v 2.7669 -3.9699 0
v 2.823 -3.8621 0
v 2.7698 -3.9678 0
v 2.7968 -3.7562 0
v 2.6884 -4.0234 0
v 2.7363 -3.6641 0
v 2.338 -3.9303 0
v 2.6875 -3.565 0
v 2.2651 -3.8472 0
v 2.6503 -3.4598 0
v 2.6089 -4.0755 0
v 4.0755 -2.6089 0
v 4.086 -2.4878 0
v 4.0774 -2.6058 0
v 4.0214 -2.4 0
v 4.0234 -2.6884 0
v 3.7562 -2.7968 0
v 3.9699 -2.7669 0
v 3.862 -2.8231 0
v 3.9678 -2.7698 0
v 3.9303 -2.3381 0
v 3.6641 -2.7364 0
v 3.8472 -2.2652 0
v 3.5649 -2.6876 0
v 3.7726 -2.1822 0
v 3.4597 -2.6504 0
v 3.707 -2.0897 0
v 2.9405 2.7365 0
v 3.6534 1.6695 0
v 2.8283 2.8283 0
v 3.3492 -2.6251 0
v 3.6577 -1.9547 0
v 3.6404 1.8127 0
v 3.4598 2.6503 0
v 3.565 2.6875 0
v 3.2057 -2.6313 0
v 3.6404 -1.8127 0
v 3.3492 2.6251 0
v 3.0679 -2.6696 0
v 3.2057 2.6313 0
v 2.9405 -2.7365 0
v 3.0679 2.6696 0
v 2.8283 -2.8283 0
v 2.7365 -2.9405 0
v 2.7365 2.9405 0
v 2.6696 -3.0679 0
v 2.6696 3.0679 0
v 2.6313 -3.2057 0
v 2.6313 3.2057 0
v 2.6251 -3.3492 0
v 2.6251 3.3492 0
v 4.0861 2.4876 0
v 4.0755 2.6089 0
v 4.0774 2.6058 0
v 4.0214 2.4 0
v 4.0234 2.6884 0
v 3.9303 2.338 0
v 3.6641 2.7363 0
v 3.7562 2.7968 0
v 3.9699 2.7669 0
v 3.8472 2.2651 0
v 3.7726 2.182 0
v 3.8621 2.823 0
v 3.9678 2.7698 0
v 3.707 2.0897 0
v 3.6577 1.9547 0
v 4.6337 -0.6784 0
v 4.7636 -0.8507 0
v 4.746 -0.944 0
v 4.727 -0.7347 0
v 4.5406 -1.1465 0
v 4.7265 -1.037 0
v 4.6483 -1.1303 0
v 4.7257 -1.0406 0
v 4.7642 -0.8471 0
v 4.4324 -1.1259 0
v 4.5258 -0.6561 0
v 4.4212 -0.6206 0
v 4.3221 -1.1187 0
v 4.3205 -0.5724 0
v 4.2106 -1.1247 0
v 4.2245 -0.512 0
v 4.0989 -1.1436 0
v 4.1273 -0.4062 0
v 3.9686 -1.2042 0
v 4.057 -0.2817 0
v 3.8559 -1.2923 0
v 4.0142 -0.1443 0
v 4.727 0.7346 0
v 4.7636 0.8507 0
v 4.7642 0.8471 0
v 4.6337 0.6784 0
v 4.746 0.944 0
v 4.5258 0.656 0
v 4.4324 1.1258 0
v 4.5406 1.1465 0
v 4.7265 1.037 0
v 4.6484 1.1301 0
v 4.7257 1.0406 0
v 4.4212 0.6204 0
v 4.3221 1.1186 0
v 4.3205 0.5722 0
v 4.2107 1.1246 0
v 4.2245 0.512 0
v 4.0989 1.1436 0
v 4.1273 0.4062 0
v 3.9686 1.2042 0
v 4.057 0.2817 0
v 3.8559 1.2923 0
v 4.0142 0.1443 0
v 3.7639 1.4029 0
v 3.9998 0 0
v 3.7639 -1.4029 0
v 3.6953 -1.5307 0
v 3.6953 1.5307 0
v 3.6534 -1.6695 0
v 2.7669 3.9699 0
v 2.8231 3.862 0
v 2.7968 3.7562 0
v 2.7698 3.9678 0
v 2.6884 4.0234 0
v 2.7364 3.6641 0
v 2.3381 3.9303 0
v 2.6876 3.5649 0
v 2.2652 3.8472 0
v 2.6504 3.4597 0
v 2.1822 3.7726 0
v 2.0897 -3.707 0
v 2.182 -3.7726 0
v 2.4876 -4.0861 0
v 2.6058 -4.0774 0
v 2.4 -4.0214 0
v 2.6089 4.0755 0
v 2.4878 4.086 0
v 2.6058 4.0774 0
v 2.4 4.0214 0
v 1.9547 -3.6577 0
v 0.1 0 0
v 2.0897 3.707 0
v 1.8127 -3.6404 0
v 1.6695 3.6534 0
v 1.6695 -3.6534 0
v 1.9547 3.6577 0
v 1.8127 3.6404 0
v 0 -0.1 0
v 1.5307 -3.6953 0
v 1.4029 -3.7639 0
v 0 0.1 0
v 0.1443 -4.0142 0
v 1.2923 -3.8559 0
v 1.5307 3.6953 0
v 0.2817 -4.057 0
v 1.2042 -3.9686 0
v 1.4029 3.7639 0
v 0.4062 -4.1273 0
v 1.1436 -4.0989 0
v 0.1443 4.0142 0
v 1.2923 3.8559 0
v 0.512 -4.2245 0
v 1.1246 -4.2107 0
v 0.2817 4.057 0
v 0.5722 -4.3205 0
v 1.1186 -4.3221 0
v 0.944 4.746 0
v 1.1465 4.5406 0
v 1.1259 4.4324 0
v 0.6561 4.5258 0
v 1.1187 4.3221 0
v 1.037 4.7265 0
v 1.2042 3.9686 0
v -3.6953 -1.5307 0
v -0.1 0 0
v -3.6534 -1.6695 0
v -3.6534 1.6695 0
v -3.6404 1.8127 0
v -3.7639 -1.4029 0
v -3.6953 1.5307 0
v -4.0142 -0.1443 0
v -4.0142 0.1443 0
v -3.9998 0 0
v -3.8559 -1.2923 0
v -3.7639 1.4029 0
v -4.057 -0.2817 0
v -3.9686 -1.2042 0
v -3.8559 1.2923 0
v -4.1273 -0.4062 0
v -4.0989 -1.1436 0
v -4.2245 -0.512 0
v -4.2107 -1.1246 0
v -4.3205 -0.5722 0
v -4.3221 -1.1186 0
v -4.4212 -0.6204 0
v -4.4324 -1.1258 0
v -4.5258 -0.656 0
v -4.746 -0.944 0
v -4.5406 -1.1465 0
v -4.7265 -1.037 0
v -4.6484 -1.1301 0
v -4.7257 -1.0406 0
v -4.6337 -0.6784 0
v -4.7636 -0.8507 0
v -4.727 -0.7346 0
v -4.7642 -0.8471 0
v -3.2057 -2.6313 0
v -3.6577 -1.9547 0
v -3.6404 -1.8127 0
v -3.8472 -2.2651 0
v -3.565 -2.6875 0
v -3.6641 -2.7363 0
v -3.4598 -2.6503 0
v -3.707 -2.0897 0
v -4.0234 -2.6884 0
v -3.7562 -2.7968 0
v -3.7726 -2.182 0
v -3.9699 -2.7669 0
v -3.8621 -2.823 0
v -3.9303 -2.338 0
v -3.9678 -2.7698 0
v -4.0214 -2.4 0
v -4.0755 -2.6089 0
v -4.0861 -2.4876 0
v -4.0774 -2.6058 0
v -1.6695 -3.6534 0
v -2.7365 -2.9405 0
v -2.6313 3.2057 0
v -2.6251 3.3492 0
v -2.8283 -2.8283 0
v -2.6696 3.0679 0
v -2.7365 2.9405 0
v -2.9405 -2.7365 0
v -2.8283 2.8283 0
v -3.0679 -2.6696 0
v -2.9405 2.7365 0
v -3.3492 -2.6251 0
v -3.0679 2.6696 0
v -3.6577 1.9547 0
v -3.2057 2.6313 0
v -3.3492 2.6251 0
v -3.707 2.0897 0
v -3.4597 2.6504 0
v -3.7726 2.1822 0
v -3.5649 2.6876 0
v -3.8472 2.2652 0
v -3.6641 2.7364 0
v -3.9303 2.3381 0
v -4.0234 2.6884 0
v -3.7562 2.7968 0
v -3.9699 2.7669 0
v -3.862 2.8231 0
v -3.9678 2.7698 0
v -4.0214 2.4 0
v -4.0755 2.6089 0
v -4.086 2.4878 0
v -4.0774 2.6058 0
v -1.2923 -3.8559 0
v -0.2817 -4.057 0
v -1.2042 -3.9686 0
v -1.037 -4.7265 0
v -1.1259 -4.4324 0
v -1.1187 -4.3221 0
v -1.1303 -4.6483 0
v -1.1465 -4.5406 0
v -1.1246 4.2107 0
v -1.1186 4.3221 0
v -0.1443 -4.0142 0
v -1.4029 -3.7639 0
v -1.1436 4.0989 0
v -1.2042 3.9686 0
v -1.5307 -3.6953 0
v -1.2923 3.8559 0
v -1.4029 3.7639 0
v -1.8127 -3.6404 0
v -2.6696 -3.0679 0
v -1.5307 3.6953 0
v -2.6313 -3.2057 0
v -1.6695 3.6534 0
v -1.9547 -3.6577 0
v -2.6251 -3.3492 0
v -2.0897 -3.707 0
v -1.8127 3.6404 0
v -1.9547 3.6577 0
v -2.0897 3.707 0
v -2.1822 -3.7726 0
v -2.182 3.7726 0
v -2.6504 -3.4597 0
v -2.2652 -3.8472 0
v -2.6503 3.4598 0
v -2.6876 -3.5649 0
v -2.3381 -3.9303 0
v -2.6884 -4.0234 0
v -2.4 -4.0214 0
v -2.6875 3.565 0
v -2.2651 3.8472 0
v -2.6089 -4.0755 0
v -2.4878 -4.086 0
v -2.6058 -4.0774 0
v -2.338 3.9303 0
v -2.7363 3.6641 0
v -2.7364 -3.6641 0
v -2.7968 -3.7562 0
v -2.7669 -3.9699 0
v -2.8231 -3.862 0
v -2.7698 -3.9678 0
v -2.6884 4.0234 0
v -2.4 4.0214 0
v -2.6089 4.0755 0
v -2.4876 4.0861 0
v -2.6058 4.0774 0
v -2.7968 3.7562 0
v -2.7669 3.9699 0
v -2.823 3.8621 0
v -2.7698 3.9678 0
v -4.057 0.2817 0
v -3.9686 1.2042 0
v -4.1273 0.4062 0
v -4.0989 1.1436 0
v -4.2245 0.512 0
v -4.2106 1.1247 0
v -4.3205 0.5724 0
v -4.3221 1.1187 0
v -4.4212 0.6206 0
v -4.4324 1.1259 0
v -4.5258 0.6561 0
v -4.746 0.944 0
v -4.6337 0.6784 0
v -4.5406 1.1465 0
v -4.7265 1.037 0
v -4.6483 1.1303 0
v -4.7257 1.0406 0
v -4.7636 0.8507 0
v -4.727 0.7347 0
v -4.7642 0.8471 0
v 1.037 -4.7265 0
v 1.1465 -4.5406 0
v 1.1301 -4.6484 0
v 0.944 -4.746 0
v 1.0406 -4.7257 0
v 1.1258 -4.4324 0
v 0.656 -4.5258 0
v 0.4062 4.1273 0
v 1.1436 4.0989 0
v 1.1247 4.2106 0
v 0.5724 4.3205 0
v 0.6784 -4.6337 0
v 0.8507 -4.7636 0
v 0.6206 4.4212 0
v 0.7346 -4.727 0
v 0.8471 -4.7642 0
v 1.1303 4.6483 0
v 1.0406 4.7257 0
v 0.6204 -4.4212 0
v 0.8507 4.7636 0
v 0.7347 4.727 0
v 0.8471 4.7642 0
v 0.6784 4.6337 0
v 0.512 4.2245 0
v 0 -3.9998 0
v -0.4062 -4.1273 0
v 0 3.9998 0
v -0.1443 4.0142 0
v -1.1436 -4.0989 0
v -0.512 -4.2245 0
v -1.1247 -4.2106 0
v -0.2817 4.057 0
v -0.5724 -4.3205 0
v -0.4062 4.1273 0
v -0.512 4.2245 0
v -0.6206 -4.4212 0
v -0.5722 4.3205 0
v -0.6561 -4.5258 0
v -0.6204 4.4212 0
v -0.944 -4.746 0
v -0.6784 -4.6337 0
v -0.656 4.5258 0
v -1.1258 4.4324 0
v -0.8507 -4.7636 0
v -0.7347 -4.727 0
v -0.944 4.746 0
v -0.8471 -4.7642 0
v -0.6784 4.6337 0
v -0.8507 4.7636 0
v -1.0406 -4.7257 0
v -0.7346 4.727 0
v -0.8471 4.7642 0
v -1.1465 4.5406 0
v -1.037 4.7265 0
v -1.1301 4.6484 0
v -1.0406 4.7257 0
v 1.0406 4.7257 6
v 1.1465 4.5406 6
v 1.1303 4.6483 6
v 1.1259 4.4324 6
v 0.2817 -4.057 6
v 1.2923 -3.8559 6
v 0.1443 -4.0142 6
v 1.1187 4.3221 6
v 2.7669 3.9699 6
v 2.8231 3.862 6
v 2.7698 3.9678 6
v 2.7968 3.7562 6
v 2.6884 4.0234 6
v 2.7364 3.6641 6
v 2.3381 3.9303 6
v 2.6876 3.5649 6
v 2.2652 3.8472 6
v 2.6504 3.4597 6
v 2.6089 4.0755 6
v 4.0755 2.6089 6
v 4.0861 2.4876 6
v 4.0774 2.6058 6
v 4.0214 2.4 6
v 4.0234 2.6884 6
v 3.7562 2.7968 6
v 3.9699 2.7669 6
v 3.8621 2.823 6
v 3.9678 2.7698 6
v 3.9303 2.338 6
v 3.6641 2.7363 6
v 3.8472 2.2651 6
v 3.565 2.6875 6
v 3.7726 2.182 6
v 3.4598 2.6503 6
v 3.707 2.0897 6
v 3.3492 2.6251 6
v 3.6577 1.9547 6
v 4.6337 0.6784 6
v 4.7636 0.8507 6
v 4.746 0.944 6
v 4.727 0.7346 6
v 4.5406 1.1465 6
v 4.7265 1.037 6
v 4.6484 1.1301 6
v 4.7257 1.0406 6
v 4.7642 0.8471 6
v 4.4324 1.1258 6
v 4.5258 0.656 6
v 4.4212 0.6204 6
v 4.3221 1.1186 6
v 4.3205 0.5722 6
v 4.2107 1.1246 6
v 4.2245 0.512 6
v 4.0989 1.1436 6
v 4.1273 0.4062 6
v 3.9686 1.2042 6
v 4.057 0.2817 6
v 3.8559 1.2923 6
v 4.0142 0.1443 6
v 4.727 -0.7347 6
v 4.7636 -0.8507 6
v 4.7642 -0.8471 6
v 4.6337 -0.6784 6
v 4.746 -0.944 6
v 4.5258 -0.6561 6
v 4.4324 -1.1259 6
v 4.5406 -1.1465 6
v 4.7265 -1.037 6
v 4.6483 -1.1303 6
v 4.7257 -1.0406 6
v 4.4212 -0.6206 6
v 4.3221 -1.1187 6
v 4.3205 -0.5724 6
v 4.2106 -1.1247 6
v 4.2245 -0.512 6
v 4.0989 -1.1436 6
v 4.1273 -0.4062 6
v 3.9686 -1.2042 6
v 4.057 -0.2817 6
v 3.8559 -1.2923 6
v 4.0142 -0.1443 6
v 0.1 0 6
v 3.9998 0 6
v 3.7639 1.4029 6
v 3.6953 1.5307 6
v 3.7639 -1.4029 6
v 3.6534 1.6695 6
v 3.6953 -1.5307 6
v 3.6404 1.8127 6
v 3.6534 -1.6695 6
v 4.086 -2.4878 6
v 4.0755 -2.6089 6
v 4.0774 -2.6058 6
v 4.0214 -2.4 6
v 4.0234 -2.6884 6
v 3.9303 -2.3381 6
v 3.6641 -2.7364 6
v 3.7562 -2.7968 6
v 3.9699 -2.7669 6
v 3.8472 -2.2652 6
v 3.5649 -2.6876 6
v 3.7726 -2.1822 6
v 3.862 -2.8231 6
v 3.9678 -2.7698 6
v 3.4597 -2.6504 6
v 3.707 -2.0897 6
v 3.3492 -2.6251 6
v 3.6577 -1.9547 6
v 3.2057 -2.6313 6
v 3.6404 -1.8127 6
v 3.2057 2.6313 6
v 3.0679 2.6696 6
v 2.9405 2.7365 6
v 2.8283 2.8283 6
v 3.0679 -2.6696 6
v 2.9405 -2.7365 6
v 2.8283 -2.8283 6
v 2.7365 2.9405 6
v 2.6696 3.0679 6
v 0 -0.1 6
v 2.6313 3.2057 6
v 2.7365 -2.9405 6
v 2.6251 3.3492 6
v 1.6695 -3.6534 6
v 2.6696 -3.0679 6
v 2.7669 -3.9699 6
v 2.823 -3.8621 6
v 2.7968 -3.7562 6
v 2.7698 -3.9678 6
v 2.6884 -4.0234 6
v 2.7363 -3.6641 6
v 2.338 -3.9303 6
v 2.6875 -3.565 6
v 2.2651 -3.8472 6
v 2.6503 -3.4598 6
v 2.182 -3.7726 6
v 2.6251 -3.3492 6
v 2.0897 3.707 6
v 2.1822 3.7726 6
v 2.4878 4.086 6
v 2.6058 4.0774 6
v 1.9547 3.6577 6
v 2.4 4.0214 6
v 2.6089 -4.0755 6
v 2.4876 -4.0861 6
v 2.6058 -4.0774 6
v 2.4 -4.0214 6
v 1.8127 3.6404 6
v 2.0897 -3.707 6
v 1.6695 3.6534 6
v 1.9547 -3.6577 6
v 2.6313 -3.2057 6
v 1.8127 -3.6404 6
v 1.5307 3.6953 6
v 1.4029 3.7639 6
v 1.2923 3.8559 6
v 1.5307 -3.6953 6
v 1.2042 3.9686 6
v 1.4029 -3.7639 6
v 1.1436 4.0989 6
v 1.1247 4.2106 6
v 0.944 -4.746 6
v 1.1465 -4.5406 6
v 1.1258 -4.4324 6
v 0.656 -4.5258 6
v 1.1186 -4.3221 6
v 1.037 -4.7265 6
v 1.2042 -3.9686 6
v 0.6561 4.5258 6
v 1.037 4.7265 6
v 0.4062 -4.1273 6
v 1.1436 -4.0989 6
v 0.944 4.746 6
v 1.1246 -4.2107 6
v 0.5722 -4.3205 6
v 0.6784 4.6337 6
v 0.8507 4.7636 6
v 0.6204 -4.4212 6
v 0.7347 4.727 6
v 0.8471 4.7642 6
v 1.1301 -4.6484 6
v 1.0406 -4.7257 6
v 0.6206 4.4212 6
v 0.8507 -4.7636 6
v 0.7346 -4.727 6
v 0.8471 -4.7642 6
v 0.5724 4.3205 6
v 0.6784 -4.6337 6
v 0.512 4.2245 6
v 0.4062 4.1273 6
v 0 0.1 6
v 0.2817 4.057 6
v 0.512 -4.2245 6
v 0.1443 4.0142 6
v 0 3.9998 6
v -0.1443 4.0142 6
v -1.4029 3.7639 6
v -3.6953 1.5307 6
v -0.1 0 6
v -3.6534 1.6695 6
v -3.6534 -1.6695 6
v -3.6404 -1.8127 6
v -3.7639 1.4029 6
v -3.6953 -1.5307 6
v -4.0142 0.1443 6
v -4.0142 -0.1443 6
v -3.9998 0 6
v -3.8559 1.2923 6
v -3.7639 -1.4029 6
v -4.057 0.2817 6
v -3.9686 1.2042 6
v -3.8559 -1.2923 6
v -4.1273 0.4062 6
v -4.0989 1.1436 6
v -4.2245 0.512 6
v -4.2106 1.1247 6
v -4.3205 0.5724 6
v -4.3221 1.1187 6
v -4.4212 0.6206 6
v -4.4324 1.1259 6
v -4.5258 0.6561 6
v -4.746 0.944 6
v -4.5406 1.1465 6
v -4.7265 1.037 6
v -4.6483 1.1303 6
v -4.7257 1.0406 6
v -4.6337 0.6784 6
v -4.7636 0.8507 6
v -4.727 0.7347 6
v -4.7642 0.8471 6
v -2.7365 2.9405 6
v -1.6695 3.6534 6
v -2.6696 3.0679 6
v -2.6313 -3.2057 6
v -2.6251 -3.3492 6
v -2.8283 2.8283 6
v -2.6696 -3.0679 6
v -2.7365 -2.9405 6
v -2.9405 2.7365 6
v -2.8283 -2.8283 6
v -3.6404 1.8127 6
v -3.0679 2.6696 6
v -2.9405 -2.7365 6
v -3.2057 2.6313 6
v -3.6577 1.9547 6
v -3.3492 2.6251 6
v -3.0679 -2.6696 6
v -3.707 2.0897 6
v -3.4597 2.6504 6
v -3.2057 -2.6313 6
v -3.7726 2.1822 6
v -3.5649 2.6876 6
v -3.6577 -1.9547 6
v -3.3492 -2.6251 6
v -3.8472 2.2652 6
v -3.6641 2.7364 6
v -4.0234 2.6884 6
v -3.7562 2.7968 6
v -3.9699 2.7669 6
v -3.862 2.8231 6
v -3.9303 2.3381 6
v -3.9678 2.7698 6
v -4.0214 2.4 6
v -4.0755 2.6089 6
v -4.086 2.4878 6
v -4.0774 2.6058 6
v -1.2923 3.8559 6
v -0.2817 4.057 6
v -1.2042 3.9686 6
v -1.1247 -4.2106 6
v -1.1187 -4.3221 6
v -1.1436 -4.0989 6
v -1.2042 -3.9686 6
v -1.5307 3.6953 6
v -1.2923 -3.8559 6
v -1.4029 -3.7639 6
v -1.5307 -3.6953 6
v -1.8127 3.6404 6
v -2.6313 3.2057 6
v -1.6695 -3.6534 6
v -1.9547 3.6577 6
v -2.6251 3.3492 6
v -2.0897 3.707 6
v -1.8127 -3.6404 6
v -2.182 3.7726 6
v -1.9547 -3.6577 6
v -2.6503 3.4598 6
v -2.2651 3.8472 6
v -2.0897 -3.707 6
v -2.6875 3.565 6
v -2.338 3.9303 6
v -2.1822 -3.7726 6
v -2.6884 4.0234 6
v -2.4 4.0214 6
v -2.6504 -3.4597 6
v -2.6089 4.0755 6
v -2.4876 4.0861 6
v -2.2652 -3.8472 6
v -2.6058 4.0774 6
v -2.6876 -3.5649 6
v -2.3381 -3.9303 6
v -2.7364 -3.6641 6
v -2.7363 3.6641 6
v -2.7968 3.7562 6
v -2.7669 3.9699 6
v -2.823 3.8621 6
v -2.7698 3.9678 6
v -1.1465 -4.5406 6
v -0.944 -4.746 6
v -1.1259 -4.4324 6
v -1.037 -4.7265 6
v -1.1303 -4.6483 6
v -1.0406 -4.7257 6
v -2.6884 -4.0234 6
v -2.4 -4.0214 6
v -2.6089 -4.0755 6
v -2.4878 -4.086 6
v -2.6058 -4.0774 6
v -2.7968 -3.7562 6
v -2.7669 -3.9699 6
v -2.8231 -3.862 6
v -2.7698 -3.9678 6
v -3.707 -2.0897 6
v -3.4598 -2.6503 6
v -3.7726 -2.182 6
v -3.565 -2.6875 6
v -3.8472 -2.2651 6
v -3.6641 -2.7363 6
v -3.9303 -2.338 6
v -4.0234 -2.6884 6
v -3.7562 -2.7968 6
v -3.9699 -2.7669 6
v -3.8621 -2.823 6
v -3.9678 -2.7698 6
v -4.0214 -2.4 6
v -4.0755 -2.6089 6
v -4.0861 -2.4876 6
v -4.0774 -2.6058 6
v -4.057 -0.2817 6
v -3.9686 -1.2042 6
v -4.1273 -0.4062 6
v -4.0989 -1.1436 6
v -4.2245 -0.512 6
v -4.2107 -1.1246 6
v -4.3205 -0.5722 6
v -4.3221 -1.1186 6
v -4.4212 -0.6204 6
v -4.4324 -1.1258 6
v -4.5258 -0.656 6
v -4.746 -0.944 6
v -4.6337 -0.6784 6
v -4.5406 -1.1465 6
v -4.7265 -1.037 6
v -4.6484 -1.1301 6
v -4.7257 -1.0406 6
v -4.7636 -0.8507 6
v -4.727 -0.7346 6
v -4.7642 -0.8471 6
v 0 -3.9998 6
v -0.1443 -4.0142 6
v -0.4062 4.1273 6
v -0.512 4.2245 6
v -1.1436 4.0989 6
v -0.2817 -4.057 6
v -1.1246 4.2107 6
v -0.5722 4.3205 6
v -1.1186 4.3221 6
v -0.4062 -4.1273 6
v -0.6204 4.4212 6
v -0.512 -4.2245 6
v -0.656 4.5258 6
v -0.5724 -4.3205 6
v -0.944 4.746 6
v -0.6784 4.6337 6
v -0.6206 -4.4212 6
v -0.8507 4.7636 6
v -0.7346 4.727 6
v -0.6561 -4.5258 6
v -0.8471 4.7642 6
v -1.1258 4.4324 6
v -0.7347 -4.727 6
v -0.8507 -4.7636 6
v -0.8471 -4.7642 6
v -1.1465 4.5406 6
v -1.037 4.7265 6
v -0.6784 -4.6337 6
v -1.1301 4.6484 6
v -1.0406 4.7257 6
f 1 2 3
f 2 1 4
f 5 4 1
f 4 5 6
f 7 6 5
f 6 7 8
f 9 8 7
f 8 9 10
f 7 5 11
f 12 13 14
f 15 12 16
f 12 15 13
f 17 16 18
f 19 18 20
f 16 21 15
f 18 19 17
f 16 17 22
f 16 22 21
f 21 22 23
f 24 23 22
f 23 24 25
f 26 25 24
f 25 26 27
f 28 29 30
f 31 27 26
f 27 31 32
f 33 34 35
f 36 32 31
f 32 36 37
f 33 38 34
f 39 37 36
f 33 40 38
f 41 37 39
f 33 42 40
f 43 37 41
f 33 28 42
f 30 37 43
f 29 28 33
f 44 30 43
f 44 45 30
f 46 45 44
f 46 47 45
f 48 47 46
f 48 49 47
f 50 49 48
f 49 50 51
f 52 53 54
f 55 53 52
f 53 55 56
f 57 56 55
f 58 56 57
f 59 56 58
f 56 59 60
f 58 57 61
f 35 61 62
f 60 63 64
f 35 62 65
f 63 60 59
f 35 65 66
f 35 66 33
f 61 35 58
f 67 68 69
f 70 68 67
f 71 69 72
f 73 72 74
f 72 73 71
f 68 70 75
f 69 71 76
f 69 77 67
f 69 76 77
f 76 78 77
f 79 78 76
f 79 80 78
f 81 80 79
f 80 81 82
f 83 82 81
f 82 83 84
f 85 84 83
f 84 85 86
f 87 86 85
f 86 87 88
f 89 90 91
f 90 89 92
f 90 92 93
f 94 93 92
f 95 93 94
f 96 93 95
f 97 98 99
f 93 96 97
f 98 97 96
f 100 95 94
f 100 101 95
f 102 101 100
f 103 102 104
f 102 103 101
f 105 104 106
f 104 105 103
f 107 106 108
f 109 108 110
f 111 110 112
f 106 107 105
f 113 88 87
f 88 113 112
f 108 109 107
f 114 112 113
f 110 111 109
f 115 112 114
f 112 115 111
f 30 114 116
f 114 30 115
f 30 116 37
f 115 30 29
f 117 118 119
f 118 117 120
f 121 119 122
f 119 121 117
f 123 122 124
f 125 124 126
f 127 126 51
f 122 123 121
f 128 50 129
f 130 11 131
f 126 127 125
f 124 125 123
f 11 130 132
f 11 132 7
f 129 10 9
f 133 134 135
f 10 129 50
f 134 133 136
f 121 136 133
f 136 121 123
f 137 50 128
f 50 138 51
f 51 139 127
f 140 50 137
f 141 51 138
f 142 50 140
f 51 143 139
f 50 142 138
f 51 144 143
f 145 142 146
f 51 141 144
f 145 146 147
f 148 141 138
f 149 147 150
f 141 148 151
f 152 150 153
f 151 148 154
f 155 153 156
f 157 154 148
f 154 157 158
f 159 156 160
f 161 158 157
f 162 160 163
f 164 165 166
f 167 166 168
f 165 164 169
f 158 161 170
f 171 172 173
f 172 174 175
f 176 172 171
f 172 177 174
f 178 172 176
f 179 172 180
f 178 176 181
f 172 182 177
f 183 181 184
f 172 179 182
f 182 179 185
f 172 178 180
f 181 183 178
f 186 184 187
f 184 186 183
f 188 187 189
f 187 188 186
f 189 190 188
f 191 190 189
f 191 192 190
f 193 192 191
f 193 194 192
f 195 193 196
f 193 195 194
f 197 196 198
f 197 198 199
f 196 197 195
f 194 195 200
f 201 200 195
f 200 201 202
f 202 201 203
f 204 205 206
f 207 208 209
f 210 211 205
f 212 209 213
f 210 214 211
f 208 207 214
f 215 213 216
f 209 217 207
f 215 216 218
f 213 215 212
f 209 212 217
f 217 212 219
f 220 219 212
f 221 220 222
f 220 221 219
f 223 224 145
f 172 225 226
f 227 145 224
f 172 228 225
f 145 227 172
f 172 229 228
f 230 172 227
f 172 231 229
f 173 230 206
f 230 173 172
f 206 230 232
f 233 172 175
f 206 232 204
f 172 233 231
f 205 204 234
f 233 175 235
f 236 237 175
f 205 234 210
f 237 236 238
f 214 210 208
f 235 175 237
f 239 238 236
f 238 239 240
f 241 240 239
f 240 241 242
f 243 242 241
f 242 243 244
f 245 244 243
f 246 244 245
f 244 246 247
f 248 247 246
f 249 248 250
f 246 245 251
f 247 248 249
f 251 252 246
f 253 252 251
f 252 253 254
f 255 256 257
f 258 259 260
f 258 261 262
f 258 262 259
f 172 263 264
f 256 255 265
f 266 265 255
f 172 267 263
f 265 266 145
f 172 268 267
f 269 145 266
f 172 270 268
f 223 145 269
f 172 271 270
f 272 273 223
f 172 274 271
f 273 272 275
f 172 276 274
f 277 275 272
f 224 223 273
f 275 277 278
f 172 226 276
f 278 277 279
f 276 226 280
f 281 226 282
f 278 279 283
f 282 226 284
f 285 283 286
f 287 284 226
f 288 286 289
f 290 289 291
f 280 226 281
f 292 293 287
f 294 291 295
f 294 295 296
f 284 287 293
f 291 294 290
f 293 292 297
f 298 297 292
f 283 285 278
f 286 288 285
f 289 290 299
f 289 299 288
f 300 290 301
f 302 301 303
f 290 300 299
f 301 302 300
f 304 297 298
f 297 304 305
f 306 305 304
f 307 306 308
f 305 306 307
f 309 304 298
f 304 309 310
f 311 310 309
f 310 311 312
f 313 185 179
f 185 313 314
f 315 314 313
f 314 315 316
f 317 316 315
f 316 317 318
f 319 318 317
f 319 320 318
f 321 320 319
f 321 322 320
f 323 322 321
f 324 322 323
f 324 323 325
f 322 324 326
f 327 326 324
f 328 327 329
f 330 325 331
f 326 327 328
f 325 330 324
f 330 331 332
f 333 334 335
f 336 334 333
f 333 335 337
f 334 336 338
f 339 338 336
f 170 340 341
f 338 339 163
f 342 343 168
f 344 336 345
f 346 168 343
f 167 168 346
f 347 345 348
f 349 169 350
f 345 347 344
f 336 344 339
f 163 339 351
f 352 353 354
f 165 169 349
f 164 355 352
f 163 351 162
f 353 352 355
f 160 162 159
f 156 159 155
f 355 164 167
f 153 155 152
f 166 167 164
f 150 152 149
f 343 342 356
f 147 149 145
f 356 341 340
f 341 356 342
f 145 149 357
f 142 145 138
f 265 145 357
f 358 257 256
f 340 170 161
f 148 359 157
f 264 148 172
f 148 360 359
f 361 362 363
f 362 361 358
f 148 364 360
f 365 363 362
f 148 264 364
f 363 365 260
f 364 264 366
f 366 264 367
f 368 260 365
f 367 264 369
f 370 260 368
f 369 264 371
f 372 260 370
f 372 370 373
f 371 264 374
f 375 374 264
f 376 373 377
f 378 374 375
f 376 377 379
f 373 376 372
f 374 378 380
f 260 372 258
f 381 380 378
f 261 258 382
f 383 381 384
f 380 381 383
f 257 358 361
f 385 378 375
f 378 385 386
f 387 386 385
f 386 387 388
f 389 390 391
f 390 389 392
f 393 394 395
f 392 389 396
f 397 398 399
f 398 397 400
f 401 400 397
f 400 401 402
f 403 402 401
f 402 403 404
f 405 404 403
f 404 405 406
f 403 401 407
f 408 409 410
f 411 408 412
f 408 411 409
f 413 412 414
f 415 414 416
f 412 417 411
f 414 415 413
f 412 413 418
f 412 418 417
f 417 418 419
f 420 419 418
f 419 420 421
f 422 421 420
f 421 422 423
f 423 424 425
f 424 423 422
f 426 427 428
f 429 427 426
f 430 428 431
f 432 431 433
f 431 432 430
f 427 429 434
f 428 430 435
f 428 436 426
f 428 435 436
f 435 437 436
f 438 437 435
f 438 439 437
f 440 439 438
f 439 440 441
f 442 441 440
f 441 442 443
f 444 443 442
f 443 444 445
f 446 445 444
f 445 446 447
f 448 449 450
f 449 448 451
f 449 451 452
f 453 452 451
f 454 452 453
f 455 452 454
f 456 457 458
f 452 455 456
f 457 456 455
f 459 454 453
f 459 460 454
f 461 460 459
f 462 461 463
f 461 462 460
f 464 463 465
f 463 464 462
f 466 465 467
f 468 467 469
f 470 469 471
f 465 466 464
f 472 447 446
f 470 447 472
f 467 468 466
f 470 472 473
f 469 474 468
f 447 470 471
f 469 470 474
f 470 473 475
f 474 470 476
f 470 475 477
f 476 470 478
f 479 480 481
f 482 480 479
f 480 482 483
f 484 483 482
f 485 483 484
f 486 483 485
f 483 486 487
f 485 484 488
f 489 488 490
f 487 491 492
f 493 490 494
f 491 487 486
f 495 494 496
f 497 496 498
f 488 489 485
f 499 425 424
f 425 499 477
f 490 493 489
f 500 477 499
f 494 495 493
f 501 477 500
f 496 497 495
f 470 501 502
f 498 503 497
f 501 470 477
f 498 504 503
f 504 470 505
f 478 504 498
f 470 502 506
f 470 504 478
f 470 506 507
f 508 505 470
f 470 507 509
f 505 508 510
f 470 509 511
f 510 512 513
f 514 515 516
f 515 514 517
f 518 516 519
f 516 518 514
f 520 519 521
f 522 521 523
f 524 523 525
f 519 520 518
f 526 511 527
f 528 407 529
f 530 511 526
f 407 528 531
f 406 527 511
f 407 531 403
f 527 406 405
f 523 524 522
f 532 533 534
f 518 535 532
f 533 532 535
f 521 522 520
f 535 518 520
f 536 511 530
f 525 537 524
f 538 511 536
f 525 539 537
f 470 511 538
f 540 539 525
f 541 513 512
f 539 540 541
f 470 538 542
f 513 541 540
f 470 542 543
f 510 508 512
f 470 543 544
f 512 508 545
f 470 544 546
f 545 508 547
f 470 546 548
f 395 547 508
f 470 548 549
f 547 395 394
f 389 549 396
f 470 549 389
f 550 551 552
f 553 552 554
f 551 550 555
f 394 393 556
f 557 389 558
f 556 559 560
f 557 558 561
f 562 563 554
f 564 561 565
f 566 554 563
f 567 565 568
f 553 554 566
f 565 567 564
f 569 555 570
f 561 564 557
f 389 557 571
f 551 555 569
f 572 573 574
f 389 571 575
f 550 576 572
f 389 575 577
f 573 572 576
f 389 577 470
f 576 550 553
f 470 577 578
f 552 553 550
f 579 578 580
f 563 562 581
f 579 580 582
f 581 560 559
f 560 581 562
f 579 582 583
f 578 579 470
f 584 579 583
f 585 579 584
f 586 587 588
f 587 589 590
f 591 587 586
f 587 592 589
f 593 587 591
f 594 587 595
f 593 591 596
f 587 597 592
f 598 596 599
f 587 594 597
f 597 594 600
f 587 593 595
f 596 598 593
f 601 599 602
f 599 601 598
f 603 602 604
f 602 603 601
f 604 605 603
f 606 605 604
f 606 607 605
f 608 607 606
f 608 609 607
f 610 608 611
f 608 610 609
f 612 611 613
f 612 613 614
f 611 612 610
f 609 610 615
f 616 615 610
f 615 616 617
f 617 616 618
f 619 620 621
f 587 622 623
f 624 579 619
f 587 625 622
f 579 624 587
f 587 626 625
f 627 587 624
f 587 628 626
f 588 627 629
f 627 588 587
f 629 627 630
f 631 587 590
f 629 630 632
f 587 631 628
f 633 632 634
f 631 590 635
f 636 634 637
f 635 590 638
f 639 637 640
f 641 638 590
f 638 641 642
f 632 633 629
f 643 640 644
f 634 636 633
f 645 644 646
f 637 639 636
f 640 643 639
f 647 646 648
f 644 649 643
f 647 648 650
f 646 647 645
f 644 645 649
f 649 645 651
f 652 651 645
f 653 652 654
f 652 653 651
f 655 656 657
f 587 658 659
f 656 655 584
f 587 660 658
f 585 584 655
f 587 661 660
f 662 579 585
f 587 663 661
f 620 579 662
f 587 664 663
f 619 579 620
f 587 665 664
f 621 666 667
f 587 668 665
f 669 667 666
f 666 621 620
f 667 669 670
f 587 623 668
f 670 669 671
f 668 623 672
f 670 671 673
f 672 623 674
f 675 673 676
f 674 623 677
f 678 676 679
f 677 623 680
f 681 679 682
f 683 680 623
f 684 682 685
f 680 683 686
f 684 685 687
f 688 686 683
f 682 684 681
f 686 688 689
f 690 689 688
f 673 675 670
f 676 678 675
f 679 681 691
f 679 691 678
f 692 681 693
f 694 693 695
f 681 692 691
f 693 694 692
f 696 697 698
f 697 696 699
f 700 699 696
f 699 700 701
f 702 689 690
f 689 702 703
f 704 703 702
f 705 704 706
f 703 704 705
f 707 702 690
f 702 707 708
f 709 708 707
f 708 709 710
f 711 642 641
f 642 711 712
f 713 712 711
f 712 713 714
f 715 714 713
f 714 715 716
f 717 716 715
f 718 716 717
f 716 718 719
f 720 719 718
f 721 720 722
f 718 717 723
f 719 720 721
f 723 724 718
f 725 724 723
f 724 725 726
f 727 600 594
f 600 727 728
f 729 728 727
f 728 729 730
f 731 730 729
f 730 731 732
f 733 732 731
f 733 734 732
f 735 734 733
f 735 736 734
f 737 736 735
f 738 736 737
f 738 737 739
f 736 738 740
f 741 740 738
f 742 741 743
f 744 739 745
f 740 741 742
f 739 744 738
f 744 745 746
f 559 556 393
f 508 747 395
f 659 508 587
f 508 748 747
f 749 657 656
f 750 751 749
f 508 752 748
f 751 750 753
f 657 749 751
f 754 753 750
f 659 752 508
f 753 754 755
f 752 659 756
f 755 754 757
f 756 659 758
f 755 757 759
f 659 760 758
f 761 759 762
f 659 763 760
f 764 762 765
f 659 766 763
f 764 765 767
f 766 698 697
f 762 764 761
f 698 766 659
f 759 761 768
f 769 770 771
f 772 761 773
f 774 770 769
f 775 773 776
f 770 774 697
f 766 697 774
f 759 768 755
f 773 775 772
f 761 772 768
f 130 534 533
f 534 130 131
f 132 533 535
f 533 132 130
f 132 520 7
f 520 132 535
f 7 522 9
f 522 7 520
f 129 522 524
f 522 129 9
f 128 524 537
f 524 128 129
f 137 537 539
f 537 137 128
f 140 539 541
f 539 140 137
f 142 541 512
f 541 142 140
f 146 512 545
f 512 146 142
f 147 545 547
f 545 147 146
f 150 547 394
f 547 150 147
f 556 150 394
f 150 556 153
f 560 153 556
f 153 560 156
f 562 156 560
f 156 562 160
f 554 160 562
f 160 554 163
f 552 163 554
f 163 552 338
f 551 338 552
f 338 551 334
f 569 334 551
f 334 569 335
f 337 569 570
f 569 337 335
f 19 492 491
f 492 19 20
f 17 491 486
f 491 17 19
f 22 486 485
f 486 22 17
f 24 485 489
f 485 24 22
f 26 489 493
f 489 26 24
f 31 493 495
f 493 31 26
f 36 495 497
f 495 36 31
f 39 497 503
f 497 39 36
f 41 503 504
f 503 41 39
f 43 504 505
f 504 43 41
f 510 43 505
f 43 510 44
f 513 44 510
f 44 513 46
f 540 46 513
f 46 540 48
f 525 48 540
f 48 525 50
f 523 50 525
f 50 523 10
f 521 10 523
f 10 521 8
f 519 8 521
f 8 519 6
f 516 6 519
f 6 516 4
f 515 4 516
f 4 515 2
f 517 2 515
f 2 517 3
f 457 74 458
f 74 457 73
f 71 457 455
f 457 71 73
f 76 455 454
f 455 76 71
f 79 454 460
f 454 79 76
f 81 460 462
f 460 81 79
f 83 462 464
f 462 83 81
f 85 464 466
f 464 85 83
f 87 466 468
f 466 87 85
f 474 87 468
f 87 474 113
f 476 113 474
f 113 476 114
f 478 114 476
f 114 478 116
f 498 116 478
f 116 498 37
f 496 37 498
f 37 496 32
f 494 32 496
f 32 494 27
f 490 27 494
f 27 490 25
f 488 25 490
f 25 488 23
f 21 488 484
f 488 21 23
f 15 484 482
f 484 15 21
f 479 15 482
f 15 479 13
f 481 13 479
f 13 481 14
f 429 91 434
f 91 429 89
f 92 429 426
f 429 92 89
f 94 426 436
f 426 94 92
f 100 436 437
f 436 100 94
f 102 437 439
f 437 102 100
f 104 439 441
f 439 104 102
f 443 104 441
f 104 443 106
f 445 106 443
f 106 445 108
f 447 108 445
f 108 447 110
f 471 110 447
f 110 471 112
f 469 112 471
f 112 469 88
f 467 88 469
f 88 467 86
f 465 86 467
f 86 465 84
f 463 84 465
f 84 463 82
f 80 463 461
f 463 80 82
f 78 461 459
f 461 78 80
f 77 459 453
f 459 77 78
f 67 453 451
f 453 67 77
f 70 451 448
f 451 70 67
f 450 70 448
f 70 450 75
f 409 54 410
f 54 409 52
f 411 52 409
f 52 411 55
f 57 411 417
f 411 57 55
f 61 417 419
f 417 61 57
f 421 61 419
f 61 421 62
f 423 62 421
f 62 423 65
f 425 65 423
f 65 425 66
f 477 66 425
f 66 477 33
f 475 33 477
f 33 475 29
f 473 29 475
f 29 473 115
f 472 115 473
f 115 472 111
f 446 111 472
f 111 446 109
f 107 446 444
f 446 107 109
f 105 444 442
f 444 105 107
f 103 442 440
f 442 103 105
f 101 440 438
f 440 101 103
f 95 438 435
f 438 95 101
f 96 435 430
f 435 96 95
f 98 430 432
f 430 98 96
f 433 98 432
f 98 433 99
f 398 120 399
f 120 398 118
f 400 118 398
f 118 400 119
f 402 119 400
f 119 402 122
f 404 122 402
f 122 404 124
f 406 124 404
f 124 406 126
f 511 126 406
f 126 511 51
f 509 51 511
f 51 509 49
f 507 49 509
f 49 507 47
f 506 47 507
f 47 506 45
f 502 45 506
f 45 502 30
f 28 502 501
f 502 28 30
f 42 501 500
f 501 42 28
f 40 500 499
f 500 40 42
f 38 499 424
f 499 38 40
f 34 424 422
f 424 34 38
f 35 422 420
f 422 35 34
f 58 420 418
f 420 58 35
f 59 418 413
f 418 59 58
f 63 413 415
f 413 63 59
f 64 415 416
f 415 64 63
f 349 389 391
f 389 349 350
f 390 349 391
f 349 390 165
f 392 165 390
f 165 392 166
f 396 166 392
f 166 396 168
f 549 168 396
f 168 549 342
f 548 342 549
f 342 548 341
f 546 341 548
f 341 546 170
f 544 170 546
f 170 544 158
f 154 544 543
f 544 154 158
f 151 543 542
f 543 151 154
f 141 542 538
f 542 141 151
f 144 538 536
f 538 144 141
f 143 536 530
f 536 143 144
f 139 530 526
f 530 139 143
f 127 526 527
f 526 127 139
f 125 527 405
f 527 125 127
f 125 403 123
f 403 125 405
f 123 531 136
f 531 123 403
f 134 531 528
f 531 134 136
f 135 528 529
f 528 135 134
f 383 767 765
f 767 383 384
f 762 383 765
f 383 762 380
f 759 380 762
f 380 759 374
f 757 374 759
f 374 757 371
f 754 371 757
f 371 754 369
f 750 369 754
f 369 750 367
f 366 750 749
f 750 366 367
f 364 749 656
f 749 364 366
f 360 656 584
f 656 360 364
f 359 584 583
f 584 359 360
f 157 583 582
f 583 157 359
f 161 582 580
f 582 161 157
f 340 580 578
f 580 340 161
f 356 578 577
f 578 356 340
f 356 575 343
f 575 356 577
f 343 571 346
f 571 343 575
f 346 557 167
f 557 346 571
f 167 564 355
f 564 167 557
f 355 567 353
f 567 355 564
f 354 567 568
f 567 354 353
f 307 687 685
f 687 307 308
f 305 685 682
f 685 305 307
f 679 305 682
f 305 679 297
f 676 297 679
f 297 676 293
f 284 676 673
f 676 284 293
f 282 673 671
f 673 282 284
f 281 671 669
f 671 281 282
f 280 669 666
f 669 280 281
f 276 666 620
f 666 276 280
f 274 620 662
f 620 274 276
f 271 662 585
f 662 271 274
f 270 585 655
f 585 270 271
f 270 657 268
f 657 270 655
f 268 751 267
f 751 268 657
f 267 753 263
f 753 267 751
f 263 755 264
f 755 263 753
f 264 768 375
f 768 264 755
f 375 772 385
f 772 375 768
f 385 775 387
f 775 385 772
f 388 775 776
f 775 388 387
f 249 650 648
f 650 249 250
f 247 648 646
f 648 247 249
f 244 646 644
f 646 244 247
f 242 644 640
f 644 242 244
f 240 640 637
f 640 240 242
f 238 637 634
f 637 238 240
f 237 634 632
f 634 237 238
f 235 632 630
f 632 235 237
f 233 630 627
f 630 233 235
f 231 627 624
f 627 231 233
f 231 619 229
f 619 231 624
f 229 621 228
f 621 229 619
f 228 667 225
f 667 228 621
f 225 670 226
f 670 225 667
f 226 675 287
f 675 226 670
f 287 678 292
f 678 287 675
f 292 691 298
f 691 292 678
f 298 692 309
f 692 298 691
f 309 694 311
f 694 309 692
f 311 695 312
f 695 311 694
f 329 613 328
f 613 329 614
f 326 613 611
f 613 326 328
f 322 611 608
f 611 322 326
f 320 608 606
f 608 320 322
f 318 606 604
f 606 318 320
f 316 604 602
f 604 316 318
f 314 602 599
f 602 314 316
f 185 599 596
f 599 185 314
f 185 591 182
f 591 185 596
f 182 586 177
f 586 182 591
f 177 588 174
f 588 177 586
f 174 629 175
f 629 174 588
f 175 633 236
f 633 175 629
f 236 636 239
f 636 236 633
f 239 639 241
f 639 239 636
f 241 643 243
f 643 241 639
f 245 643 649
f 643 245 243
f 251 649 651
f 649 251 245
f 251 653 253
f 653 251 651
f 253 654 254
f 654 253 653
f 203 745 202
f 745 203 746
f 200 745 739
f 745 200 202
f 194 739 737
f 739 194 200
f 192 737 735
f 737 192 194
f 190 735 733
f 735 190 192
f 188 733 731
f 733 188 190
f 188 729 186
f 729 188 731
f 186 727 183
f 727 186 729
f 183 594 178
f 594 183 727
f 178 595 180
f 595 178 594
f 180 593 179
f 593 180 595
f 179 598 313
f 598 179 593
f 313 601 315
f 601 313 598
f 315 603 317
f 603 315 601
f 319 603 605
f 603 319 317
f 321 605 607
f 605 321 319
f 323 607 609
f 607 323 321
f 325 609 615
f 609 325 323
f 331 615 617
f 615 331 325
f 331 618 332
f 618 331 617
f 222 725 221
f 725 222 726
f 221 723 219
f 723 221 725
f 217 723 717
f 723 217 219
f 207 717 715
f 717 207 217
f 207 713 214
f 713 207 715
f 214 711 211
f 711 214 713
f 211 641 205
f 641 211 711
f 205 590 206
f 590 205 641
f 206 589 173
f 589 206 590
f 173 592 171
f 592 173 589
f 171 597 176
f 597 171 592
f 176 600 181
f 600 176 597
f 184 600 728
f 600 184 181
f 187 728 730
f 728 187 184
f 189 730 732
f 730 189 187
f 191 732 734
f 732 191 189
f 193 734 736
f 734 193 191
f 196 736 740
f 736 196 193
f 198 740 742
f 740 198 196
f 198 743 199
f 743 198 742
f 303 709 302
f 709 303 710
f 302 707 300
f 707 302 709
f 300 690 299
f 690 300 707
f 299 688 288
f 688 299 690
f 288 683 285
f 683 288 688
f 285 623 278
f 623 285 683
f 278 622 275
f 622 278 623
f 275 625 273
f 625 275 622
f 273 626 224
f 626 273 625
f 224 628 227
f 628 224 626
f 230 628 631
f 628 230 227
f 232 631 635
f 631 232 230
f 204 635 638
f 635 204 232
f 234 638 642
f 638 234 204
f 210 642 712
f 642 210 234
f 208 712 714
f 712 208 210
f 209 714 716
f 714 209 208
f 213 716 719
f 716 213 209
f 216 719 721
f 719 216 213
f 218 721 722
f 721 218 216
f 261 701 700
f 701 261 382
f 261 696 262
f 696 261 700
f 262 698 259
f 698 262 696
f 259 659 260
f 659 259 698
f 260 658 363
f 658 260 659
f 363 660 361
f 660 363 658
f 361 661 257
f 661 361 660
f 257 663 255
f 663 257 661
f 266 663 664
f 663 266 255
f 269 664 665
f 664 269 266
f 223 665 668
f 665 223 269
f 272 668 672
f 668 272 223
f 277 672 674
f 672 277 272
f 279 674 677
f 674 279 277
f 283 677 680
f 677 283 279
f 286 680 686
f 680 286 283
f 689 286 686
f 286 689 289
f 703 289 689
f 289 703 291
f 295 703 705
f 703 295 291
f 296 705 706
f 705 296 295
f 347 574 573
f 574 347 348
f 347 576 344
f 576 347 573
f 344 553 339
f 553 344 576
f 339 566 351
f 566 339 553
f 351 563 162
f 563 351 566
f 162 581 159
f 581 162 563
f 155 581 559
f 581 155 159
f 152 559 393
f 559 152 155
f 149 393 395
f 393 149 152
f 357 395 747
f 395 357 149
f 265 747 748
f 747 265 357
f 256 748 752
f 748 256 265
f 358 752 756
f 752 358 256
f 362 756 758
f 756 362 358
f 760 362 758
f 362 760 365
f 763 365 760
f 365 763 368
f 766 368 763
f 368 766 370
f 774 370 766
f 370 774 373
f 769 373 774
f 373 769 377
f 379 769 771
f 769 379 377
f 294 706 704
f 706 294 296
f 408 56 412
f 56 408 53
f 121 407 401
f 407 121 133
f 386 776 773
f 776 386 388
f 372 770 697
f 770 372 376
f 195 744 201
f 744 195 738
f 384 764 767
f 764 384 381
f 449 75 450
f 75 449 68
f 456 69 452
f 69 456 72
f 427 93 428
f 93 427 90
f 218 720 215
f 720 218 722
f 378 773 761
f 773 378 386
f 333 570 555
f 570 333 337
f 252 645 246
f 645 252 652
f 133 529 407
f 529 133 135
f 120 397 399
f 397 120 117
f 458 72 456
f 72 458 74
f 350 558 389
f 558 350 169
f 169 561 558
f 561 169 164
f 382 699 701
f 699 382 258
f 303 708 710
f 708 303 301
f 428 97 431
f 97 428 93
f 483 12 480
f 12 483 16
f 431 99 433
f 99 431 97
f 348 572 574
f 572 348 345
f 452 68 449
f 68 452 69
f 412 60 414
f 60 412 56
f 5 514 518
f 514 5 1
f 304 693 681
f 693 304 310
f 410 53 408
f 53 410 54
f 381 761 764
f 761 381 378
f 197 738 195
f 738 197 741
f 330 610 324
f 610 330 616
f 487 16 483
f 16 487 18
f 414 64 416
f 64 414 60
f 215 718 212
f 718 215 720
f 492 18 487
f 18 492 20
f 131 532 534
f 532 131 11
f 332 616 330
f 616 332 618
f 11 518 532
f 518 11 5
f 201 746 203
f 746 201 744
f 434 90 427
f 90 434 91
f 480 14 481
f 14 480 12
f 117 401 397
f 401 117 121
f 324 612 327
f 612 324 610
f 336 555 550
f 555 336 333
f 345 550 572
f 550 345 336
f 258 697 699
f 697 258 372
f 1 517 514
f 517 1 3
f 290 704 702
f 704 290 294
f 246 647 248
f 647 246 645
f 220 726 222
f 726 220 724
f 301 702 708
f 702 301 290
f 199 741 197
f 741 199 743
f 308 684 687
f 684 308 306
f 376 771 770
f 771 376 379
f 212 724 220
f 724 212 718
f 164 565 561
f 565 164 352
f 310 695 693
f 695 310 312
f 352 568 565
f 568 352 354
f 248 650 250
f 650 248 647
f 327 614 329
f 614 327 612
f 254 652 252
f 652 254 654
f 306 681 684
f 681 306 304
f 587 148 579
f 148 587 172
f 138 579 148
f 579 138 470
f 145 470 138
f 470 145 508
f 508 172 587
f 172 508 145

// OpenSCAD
$fn = 50;

use <../../../../pulley_gt2.scad>;

difference() {
	union() {
		pulley_gt2(depth = 6, number_of_teeth = 16);
	}
	union();
}
